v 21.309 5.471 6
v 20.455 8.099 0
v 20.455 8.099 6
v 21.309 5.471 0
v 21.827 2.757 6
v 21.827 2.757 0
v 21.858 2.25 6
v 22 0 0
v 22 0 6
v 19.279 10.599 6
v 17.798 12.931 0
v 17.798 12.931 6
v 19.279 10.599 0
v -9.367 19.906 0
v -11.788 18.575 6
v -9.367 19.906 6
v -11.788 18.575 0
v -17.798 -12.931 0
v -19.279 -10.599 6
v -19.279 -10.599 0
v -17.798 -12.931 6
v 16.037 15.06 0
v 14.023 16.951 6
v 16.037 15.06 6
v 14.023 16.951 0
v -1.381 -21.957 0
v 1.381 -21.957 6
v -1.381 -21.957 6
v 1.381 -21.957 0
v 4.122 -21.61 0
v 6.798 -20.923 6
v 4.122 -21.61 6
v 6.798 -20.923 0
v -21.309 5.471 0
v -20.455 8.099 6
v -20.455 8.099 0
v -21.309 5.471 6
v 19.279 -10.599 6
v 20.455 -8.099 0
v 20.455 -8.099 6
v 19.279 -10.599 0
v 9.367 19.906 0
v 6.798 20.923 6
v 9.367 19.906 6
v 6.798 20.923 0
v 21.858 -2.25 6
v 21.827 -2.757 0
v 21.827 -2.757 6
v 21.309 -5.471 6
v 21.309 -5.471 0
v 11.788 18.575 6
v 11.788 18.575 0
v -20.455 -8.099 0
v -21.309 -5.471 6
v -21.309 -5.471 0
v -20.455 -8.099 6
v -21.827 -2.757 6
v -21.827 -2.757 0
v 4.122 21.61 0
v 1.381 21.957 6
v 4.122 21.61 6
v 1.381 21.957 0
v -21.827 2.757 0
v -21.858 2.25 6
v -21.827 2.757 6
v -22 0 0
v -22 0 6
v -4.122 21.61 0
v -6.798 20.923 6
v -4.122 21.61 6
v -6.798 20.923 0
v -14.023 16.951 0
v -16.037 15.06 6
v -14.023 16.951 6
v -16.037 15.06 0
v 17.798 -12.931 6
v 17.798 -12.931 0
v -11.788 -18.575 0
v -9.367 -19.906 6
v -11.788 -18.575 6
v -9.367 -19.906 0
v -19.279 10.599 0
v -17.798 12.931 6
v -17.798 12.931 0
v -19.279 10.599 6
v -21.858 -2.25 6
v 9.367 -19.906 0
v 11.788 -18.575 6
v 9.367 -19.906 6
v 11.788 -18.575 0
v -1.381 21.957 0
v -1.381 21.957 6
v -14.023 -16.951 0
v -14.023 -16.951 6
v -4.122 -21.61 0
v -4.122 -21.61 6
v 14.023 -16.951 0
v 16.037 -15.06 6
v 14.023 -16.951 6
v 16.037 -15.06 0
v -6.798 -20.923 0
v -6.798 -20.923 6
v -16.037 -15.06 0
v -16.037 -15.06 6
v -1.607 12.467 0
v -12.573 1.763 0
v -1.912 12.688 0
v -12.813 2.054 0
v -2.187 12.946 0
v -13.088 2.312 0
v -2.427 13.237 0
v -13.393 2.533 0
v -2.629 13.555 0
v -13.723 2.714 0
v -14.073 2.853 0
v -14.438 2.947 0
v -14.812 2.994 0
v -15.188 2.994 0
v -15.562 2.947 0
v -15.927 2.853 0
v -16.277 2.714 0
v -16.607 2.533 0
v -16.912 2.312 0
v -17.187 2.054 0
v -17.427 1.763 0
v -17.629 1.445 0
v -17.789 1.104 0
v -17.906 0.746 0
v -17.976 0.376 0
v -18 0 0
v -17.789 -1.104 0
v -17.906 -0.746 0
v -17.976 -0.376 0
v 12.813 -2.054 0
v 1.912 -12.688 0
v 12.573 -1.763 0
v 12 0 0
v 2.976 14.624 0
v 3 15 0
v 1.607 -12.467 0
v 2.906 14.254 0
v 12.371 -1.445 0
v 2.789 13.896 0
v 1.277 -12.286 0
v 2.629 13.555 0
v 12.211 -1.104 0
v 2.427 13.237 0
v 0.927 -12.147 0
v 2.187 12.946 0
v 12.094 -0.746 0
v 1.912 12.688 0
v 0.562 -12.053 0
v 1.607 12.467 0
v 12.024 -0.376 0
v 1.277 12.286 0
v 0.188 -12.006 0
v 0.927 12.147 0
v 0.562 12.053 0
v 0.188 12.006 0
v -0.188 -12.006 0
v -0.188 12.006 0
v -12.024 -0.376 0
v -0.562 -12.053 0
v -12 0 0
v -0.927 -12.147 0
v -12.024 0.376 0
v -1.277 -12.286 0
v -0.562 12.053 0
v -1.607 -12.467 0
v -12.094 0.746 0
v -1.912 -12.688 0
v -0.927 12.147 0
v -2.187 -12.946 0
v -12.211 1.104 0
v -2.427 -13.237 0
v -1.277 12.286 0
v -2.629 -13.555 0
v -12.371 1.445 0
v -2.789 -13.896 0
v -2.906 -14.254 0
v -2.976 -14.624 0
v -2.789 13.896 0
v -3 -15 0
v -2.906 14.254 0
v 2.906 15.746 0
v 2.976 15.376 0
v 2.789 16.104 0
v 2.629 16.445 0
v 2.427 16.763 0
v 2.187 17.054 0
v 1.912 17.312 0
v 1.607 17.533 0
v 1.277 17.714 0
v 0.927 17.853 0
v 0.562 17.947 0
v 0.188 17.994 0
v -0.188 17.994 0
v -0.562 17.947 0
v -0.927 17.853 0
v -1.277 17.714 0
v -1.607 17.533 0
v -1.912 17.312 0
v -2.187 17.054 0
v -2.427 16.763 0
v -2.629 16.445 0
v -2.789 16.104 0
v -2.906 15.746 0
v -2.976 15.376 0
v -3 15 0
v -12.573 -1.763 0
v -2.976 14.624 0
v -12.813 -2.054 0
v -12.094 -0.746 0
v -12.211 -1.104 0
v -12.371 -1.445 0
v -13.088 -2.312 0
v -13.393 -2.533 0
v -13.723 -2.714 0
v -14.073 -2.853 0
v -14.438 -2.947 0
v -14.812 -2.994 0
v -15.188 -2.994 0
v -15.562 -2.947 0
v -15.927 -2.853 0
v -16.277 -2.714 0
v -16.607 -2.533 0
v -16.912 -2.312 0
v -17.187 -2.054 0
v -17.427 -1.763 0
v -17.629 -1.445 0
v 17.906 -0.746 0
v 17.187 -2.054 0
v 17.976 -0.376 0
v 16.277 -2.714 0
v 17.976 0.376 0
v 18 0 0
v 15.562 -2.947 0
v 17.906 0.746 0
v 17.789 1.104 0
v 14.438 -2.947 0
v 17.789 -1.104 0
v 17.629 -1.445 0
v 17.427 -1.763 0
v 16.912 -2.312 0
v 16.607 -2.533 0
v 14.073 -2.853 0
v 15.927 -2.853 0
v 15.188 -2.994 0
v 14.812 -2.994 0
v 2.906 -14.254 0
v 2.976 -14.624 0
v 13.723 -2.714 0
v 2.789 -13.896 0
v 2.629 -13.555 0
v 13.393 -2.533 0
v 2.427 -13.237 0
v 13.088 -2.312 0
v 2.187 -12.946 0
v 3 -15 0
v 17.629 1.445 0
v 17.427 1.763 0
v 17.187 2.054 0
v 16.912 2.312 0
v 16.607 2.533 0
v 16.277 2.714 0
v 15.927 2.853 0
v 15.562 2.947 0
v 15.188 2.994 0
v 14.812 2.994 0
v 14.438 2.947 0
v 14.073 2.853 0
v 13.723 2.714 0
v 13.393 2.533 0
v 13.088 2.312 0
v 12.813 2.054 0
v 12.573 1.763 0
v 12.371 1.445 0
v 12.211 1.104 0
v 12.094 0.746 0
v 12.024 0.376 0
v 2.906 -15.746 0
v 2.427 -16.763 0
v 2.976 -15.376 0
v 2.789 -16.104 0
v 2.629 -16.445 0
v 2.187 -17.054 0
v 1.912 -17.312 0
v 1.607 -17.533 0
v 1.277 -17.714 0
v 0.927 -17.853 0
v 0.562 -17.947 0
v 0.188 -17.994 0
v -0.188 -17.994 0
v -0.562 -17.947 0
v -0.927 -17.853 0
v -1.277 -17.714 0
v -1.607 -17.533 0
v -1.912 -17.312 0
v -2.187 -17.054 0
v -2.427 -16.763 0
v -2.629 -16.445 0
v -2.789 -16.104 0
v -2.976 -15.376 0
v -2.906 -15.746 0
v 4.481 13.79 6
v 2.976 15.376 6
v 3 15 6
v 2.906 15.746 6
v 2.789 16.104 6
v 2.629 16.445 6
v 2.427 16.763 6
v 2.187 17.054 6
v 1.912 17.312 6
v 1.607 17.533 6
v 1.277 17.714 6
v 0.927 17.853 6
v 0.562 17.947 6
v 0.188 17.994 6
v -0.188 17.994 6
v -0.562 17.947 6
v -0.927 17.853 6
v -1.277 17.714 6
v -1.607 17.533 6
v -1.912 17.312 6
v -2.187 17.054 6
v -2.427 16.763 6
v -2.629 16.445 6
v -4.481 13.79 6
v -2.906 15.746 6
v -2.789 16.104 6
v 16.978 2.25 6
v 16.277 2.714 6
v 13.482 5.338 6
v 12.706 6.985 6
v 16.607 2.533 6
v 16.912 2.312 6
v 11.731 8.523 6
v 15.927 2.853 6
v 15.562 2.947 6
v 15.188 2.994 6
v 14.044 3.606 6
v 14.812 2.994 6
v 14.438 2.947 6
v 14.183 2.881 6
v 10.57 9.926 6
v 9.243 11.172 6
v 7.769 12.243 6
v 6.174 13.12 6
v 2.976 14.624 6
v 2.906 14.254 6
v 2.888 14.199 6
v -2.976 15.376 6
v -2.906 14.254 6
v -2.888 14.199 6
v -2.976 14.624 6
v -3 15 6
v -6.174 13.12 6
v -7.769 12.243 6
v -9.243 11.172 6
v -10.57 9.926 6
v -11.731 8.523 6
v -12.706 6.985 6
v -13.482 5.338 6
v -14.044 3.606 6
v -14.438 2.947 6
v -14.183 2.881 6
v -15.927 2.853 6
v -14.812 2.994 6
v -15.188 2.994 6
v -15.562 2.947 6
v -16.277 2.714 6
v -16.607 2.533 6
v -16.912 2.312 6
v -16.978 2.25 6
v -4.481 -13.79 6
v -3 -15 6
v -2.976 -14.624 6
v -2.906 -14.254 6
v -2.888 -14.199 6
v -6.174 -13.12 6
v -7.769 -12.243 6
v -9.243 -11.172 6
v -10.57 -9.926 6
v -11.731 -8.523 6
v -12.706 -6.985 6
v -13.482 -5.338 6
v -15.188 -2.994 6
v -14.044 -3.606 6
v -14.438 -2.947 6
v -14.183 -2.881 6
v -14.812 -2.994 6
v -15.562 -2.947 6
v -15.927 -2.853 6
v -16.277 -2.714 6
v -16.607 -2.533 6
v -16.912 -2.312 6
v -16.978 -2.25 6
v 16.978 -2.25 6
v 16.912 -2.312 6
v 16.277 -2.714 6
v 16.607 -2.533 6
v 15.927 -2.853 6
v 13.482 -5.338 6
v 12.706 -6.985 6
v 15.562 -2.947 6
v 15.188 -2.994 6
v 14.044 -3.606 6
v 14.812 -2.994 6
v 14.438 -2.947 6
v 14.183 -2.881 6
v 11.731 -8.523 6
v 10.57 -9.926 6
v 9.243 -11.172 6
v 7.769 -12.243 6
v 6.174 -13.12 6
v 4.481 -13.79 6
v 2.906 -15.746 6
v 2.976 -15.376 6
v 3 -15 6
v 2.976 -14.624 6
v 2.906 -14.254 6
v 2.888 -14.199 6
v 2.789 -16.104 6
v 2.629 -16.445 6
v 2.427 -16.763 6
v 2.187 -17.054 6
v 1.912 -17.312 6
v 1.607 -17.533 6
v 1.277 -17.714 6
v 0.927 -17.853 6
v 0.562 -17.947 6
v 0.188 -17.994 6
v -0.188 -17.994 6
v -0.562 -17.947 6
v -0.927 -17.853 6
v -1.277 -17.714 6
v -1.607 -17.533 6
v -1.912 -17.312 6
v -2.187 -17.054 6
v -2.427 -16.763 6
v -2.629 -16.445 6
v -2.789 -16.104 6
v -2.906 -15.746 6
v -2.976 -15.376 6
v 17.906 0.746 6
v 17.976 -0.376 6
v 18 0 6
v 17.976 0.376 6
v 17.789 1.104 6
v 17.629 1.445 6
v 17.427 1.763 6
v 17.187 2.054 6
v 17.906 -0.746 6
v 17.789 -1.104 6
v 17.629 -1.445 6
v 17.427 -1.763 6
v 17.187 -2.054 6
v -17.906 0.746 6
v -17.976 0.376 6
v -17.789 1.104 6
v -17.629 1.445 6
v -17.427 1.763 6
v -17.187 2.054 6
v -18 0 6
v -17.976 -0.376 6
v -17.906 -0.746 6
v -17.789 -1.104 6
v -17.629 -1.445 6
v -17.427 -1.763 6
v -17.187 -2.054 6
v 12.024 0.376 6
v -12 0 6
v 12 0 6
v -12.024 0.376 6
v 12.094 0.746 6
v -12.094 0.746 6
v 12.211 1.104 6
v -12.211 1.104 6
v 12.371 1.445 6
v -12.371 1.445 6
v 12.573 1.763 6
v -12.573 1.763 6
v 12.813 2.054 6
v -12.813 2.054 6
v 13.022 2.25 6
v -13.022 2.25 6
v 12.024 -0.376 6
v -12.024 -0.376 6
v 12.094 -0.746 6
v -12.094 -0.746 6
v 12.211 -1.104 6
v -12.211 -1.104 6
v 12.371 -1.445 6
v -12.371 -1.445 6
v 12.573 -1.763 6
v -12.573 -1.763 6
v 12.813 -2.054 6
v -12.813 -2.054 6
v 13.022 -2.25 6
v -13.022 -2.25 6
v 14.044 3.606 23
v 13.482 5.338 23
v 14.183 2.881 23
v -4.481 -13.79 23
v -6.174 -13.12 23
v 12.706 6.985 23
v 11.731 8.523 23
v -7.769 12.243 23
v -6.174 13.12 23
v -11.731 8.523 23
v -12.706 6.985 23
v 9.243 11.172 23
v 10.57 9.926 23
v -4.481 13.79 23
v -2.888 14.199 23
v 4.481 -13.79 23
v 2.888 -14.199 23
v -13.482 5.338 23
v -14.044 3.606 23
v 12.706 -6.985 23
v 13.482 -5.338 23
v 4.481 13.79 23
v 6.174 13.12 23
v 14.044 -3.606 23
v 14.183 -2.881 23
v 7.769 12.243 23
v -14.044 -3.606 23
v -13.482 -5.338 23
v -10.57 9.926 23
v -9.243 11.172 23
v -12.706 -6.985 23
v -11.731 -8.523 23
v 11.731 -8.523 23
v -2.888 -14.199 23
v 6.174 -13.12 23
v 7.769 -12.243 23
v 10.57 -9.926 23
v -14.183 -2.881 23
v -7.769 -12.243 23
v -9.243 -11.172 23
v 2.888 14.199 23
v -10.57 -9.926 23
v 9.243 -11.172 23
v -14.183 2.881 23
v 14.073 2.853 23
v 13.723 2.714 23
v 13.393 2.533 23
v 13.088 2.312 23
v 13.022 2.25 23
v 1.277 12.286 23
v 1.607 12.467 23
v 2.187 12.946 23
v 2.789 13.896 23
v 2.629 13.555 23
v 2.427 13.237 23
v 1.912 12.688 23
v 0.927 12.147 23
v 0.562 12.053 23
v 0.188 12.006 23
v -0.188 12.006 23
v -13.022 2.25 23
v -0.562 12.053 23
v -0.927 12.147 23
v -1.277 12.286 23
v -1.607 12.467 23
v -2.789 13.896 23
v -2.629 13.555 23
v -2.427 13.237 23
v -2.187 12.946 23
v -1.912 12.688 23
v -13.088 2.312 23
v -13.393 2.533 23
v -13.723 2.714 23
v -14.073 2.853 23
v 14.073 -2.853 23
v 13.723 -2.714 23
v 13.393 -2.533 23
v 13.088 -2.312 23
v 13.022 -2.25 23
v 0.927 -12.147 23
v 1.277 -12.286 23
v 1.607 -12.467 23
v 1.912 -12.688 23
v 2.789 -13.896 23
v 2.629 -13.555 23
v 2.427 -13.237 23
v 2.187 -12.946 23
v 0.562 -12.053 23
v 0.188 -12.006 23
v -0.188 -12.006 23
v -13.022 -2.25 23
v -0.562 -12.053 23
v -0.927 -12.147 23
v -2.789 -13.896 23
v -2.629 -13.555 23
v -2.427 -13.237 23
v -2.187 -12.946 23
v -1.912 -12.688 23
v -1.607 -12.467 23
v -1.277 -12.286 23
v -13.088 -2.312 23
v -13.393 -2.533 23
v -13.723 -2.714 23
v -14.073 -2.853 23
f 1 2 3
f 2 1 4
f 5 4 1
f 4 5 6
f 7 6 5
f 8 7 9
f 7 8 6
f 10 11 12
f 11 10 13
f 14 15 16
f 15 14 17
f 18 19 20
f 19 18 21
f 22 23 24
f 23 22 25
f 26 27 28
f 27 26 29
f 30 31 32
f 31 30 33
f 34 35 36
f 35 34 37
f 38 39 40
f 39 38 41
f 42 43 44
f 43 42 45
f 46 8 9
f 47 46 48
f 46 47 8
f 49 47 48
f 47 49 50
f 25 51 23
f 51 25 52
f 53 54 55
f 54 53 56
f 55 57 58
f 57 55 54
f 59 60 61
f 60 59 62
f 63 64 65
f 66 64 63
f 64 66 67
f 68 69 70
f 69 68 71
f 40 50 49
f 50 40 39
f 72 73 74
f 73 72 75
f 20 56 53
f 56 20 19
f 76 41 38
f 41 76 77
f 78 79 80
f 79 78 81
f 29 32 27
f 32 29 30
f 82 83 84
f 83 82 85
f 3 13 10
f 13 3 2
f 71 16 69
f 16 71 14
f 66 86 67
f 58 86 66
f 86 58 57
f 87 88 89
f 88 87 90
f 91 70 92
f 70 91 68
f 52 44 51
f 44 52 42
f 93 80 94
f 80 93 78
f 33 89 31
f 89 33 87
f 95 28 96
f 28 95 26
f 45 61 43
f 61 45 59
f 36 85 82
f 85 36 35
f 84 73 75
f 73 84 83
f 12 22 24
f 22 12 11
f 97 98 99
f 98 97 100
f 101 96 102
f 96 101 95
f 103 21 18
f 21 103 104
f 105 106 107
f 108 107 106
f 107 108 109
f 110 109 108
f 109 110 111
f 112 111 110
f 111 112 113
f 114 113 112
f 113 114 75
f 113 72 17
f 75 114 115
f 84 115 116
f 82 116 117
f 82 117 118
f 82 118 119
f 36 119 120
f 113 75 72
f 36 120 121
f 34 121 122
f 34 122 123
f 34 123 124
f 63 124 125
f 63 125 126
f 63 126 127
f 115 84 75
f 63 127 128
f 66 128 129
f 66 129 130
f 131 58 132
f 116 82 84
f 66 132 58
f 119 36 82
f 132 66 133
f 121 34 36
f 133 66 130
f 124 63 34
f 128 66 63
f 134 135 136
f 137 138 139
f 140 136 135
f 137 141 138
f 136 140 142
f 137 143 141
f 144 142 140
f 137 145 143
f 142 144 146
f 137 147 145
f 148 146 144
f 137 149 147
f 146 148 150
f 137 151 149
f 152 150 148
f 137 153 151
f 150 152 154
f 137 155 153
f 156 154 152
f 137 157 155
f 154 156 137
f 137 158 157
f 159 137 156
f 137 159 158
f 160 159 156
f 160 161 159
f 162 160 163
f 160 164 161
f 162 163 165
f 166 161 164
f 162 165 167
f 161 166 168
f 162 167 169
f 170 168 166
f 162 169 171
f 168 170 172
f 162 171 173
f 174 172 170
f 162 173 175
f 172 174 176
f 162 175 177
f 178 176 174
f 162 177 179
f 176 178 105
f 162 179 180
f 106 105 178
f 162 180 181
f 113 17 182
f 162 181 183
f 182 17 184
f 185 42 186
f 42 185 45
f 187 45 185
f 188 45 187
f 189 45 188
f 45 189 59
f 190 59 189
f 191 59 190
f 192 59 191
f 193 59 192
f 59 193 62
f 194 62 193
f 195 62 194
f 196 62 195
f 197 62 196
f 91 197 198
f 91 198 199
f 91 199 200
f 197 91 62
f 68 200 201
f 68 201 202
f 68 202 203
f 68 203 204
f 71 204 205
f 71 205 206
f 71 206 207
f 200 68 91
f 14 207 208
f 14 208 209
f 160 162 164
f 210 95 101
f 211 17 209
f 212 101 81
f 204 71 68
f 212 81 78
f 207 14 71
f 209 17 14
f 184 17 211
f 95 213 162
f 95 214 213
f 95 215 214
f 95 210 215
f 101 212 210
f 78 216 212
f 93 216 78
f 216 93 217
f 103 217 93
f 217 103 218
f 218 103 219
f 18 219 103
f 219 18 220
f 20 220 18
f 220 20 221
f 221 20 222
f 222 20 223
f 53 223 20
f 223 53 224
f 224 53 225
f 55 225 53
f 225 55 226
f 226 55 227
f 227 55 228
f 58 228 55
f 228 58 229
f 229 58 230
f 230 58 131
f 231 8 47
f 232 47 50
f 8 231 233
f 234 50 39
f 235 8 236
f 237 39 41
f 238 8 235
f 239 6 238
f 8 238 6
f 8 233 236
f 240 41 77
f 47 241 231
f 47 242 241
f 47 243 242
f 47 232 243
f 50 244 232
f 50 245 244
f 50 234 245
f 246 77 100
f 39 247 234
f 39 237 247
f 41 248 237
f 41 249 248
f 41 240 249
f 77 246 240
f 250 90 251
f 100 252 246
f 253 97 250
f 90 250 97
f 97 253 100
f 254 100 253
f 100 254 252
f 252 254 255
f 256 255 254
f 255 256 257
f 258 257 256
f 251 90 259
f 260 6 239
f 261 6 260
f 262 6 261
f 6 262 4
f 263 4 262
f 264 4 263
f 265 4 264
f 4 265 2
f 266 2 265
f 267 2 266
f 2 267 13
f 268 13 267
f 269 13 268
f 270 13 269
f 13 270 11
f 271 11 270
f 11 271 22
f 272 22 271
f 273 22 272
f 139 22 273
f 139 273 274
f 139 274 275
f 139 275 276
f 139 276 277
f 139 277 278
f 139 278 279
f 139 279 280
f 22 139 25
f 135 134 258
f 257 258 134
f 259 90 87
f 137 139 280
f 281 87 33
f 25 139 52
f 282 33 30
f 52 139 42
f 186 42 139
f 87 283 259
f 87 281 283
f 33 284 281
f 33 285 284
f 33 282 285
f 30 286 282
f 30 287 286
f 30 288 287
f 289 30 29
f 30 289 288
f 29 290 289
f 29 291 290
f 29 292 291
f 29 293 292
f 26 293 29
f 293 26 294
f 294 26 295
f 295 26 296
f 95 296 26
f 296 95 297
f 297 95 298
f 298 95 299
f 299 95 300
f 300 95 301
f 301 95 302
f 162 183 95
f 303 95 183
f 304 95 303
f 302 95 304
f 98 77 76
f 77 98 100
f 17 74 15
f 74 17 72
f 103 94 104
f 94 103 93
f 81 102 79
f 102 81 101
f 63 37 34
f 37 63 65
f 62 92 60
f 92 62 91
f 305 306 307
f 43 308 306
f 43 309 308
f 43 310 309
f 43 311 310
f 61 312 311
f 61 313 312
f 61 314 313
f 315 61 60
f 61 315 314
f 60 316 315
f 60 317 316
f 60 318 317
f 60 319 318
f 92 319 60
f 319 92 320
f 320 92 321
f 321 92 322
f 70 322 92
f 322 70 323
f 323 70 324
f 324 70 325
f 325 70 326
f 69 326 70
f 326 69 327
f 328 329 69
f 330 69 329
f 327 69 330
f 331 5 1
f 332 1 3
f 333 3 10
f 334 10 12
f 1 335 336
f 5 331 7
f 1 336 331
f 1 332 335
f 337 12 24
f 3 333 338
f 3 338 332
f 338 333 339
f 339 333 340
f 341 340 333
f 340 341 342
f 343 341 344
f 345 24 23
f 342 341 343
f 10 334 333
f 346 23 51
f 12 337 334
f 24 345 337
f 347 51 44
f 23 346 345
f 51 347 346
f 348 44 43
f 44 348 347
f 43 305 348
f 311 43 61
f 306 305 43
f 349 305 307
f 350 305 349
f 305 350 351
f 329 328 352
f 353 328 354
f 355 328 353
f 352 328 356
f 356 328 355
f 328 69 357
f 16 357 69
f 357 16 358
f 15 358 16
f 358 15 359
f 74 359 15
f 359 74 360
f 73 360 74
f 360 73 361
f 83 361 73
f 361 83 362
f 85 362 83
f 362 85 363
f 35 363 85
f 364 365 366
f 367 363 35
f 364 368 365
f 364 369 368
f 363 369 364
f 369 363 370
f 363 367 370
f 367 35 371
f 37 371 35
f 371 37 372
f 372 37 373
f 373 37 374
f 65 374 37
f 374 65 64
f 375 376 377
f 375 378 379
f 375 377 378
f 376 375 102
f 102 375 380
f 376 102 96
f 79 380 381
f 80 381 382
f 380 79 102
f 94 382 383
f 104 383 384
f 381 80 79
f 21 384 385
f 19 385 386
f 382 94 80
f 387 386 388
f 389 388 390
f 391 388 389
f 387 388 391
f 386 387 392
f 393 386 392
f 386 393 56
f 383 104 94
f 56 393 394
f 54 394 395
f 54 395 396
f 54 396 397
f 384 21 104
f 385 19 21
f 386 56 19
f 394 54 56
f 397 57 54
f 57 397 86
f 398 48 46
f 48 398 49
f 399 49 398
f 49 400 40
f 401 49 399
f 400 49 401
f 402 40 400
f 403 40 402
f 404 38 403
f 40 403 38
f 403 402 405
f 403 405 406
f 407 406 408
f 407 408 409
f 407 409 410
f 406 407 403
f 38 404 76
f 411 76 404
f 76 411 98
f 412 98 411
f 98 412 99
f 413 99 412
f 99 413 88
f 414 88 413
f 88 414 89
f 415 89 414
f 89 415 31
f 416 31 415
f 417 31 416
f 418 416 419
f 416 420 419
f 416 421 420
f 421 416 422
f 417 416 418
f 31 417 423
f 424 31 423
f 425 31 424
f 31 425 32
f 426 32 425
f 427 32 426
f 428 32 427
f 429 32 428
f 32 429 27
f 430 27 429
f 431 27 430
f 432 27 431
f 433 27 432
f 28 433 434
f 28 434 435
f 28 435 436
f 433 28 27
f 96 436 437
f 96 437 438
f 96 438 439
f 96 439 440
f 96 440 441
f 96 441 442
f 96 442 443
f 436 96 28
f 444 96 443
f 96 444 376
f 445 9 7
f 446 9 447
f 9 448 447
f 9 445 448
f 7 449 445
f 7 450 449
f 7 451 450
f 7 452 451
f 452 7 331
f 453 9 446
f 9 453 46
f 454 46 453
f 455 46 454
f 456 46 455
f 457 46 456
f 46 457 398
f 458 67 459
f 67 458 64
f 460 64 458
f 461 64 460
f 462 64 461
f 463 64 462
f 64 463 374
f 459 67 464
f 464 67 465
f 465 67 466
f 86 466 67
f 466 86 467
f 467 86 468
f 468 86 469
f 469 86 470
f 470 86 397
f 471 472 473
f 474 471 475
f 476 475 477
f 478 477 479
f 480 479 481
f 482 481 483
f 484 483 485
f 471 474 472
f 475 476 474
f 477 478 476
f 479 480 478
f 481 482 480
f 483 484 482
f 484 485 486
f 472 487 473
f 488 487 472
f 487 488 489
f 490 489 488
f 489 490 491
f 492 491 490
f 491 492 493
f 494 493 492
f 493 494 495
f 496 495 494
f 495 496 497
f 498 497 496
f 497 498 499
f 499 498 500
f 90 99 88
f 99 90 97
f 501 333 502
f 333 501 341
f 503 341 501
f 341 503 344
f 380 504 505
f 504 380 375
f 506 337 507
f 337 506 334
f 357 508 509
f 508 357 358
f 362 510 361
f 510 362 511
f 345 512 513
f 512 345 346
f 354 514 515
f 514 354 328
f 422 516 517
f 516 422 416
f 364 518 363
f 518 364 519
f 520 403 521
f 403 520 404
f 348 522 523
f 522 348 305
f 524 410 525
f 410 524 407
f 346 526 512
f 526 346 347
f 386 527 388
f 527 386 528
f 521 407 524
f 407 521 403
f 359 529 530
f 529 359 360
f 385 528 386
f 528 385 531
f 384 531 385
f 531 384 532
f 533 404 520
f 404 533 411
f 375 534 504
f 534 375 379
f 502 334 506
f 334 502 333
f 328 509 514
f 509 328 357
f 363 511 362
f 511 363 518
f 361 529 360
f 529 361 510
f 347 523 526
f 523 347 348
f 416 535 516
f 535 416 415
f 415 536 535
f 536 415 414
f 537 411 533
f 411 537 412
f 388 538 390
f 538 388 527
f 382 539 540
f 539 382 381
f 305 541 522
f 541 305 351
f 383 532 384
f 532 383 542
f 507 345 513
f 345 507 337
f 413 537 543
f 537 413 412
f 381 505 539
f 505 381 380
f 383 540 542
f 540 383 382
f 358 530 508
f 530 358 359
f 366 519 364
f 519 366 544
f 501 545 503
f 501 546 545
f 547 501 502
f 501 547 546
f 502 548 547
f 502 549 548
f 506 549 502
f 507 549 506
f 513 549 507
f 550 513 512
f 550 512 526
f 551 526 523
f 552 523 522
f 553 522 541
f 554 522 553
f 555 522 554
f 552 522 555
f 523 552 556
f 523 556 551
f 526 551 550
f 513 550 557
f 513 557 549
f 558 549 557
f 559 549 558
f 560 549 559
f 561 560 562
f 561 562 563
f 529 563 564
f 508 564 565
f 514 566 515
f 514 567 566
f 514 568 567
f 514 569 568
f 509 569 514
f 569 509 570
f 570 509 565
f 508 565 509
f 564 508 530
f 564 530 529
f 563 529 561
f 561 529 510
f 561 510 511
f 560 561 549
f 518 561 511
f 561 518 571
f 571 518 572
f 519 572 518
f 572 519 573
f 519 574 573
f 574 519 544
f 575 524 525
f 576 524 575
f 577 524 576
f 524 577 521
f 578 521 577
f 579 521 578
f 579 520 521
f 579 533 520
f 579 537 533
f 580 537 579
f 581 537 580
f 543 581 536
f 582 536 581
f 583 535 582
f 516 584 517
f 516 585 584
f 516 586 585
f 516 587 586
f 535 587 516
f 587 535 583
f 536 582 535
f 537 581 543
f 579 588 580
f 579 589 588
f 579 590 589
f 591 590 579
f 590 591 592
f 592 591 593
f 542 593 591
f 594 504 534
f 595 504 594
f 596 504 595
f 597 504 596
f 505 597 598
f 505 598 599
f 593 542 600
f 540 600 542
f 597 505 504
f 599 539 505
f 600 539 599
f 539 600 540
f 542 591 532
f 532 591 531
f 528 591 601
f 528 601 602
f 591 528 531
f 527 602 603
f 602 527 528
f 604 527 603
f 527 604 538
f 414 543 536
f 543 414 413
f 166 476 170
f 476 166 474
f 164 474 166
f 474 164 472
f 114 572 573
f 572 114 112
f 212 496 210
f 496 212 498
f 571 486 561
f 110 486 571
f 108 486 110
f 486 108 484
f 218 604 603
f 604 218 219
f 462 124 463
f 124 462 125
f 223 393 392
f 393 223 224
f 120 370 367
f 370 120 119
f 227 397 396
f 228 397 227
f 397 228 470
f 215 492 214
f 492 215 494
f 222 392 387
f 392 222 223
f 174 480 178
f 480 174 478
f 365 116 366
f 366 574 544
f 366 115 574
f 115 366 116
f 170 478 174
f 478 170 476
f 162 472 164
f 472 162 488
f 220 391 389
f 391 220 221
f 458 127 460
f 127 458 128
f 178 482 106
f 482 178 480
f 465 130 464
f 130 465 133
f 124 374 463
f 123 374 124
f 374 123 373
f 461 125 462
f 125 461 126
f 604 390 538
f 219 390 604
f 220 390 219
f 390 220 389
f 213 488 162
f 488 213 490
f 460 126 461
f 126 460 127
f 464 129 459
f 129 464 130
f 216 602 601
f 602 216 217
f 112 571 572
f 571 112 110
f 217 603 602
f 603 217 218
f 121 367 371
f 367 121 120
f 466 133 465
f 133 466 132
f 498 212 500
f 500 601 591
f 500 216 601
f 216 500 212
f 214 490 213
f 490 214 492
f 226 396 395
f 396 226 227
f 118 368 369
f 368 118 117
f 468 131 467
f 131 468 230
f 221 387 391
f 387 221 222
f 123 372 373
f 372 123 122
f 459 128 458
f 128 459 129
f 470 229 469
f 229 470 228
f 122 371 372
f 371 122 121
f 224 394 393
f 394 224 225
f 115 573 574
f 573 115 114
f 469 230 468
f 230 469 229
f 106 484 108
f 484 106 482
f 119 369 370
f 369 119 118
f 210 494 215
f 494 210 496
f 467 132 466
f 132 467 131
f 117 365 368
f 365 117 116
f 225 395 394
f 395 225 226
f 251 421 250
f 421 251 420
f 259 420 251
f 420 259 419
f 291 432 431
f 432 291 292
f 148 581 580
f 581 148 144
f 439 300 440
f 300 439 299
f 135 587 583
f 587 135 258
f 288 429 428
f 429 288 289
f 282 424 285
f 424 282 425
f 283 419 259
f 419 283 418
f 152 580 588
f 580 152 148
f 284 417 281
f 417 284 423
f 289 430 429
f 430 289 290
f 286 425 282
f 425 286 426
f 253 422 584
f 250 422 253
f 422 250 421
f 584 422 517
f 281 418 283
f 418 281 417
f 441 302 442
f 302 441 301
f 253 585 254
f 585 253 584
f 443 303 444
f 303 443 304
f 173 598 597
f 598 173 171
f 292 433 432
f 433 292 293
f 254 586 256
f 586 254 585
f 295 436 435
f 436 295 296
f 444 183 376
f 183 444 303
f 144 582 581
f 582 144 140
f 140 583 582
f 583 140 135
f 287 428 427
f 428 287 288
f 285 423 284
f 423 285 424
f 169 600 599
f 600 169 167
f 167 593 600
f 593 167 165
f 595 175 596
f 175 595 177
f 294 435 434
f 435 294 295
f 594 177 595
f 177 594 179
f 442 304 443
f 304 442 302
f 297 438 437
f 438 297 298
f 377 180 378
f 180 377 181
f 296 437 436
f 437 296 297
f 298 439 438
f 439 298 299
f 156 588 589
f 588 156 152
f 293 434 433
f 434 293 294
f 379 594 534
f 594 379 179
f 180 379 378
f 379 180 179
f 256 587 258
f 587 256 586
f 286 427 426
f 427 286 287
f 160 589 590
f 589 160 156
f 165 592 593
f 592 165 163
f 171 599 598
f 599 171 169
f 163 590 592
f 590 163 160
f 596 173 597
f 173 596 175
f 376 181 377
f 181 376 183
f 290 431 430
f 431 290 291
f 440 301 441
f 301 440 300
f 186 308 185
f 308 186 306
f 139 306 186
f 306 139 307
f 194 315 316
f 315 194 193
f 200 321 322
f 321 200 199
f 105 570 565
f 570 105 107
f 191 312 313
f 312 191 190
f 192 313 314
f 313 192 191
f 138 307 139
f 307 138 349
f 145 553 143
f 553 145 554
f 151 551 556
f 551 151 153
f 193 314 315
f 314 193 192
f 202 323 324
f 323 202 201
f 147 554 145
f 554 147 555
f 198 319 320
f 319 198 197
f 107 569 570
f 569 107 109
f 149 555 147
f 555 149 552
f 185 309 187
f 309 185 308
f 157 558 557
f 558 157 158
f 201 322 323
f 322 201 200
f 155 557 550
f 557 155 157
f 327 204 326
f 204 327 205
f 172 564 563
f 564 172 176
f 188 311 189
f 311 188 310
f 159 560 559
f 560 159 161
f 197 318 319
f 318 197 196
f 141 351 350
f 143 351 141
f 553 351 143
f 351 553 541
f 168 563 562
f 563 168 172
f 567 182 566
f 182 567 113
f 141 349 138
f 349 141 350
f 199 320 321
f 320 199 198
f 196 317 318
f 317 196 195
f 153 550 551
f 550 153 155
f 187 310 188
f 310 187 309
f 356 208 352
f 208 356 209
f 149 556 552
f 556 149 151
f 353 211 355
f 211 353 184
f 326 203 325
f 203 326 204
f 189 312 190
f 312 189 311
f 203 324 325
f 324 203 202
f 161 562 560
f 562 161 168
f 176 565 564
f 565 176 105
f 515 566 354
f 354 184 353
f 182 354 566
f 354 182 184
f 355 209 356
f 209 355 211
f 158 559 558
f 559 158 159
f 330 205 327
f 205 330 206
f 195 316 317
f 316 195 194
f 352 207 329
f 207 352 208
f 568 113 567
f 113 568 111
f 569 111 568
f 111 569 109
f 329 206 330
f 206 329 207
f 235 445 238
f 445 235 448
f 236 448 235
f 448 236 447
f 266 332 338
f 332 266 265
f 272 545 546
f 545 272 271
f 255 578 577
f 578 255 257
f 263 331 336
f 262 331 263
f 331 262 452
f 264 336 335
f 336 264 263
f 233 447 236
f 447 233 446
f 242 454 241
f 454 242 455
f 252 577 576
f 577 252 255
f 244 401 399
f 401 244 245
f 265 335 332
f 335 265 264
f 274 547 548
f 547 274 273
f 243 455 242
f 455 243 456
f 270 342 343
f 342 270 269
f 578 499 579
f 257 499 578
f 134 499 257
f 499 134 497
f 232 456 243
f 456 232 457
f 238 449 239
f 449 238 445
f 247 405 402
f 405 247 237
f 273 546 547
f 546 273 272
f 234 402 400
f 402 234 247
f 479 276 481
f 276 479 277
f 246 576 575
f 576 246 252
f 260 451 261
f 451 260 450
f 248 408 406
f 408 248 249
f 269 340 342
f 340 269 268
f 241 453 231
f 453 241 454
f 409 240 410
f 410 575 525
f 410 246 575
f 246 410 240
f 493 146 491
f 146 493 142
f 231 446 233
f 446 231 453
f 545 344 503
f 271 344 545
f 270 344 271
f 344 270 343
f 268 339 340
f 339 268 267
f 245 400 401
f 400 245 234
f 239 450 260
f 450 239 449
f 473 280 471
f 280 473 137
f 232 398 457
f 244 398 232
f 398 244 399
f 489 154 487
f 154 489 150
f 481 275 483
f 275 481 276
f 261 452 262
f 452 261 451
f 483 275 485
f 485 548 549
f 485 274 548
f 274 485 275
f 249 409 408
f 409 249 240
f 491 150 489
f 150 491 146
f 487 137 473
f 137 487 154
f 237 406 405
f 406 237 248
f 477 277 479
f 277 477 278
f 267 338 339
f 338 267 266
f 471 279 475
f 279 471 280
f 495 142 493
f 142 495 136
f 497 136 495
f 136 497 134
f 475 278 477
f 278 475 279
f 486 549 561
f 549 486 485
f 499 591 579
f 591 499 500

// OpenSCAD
$fn = 50;


difference() {
	union() {
		translate(v = [0, 0, 0.0000000000]) {
			rotate(a = [0, 0, 0]) {
				cylinder(h = 6, r = 22.0000000000);
			}
		}
		translate(v = [0, 0, 3.0000000000]) {
			rotate(a = [0, 0, 0]) {
				cylinder(h = 20, r = 14.5000000000);
			}
		}
	}
	union() {
		translate(v = [-15.0000000000, 0.0000000000, -125.0000000000]) {
			rotate(a = [0, 0, 0]) {
				cylinder(h = 250, r = 3.0000000000);
			}
		}
		translate(v = [0.0000000000, -15.0000000000, -125.0000000000]) {
			rotate(a = [0, 0, 0]) {
				cylinder(h = 250, r = 3.0000000000);
			}
		}
		translate(v = [0.0000000000, 15.0000000000, -125.0000000000]) {
			rotate(a = [0, 0, 0]) {
				cylinder(h = 250, r = 3.0000000000);
			}
		}
		translate(v = [15.0000000000, 0.0000000000, -125.0000000000]) {
			rotate(a = [0, 0, 0]) {
				cylinder(h = 250, r = 3.0000000000);
			}
		}
		translate(v = [-27.0000000000, -2.2500000000, 6]) {
			rotate(a = [0, 0, 0]) {
				cube(size = [54, 4.5000000000, 20]);
			}
		}
	}
}
